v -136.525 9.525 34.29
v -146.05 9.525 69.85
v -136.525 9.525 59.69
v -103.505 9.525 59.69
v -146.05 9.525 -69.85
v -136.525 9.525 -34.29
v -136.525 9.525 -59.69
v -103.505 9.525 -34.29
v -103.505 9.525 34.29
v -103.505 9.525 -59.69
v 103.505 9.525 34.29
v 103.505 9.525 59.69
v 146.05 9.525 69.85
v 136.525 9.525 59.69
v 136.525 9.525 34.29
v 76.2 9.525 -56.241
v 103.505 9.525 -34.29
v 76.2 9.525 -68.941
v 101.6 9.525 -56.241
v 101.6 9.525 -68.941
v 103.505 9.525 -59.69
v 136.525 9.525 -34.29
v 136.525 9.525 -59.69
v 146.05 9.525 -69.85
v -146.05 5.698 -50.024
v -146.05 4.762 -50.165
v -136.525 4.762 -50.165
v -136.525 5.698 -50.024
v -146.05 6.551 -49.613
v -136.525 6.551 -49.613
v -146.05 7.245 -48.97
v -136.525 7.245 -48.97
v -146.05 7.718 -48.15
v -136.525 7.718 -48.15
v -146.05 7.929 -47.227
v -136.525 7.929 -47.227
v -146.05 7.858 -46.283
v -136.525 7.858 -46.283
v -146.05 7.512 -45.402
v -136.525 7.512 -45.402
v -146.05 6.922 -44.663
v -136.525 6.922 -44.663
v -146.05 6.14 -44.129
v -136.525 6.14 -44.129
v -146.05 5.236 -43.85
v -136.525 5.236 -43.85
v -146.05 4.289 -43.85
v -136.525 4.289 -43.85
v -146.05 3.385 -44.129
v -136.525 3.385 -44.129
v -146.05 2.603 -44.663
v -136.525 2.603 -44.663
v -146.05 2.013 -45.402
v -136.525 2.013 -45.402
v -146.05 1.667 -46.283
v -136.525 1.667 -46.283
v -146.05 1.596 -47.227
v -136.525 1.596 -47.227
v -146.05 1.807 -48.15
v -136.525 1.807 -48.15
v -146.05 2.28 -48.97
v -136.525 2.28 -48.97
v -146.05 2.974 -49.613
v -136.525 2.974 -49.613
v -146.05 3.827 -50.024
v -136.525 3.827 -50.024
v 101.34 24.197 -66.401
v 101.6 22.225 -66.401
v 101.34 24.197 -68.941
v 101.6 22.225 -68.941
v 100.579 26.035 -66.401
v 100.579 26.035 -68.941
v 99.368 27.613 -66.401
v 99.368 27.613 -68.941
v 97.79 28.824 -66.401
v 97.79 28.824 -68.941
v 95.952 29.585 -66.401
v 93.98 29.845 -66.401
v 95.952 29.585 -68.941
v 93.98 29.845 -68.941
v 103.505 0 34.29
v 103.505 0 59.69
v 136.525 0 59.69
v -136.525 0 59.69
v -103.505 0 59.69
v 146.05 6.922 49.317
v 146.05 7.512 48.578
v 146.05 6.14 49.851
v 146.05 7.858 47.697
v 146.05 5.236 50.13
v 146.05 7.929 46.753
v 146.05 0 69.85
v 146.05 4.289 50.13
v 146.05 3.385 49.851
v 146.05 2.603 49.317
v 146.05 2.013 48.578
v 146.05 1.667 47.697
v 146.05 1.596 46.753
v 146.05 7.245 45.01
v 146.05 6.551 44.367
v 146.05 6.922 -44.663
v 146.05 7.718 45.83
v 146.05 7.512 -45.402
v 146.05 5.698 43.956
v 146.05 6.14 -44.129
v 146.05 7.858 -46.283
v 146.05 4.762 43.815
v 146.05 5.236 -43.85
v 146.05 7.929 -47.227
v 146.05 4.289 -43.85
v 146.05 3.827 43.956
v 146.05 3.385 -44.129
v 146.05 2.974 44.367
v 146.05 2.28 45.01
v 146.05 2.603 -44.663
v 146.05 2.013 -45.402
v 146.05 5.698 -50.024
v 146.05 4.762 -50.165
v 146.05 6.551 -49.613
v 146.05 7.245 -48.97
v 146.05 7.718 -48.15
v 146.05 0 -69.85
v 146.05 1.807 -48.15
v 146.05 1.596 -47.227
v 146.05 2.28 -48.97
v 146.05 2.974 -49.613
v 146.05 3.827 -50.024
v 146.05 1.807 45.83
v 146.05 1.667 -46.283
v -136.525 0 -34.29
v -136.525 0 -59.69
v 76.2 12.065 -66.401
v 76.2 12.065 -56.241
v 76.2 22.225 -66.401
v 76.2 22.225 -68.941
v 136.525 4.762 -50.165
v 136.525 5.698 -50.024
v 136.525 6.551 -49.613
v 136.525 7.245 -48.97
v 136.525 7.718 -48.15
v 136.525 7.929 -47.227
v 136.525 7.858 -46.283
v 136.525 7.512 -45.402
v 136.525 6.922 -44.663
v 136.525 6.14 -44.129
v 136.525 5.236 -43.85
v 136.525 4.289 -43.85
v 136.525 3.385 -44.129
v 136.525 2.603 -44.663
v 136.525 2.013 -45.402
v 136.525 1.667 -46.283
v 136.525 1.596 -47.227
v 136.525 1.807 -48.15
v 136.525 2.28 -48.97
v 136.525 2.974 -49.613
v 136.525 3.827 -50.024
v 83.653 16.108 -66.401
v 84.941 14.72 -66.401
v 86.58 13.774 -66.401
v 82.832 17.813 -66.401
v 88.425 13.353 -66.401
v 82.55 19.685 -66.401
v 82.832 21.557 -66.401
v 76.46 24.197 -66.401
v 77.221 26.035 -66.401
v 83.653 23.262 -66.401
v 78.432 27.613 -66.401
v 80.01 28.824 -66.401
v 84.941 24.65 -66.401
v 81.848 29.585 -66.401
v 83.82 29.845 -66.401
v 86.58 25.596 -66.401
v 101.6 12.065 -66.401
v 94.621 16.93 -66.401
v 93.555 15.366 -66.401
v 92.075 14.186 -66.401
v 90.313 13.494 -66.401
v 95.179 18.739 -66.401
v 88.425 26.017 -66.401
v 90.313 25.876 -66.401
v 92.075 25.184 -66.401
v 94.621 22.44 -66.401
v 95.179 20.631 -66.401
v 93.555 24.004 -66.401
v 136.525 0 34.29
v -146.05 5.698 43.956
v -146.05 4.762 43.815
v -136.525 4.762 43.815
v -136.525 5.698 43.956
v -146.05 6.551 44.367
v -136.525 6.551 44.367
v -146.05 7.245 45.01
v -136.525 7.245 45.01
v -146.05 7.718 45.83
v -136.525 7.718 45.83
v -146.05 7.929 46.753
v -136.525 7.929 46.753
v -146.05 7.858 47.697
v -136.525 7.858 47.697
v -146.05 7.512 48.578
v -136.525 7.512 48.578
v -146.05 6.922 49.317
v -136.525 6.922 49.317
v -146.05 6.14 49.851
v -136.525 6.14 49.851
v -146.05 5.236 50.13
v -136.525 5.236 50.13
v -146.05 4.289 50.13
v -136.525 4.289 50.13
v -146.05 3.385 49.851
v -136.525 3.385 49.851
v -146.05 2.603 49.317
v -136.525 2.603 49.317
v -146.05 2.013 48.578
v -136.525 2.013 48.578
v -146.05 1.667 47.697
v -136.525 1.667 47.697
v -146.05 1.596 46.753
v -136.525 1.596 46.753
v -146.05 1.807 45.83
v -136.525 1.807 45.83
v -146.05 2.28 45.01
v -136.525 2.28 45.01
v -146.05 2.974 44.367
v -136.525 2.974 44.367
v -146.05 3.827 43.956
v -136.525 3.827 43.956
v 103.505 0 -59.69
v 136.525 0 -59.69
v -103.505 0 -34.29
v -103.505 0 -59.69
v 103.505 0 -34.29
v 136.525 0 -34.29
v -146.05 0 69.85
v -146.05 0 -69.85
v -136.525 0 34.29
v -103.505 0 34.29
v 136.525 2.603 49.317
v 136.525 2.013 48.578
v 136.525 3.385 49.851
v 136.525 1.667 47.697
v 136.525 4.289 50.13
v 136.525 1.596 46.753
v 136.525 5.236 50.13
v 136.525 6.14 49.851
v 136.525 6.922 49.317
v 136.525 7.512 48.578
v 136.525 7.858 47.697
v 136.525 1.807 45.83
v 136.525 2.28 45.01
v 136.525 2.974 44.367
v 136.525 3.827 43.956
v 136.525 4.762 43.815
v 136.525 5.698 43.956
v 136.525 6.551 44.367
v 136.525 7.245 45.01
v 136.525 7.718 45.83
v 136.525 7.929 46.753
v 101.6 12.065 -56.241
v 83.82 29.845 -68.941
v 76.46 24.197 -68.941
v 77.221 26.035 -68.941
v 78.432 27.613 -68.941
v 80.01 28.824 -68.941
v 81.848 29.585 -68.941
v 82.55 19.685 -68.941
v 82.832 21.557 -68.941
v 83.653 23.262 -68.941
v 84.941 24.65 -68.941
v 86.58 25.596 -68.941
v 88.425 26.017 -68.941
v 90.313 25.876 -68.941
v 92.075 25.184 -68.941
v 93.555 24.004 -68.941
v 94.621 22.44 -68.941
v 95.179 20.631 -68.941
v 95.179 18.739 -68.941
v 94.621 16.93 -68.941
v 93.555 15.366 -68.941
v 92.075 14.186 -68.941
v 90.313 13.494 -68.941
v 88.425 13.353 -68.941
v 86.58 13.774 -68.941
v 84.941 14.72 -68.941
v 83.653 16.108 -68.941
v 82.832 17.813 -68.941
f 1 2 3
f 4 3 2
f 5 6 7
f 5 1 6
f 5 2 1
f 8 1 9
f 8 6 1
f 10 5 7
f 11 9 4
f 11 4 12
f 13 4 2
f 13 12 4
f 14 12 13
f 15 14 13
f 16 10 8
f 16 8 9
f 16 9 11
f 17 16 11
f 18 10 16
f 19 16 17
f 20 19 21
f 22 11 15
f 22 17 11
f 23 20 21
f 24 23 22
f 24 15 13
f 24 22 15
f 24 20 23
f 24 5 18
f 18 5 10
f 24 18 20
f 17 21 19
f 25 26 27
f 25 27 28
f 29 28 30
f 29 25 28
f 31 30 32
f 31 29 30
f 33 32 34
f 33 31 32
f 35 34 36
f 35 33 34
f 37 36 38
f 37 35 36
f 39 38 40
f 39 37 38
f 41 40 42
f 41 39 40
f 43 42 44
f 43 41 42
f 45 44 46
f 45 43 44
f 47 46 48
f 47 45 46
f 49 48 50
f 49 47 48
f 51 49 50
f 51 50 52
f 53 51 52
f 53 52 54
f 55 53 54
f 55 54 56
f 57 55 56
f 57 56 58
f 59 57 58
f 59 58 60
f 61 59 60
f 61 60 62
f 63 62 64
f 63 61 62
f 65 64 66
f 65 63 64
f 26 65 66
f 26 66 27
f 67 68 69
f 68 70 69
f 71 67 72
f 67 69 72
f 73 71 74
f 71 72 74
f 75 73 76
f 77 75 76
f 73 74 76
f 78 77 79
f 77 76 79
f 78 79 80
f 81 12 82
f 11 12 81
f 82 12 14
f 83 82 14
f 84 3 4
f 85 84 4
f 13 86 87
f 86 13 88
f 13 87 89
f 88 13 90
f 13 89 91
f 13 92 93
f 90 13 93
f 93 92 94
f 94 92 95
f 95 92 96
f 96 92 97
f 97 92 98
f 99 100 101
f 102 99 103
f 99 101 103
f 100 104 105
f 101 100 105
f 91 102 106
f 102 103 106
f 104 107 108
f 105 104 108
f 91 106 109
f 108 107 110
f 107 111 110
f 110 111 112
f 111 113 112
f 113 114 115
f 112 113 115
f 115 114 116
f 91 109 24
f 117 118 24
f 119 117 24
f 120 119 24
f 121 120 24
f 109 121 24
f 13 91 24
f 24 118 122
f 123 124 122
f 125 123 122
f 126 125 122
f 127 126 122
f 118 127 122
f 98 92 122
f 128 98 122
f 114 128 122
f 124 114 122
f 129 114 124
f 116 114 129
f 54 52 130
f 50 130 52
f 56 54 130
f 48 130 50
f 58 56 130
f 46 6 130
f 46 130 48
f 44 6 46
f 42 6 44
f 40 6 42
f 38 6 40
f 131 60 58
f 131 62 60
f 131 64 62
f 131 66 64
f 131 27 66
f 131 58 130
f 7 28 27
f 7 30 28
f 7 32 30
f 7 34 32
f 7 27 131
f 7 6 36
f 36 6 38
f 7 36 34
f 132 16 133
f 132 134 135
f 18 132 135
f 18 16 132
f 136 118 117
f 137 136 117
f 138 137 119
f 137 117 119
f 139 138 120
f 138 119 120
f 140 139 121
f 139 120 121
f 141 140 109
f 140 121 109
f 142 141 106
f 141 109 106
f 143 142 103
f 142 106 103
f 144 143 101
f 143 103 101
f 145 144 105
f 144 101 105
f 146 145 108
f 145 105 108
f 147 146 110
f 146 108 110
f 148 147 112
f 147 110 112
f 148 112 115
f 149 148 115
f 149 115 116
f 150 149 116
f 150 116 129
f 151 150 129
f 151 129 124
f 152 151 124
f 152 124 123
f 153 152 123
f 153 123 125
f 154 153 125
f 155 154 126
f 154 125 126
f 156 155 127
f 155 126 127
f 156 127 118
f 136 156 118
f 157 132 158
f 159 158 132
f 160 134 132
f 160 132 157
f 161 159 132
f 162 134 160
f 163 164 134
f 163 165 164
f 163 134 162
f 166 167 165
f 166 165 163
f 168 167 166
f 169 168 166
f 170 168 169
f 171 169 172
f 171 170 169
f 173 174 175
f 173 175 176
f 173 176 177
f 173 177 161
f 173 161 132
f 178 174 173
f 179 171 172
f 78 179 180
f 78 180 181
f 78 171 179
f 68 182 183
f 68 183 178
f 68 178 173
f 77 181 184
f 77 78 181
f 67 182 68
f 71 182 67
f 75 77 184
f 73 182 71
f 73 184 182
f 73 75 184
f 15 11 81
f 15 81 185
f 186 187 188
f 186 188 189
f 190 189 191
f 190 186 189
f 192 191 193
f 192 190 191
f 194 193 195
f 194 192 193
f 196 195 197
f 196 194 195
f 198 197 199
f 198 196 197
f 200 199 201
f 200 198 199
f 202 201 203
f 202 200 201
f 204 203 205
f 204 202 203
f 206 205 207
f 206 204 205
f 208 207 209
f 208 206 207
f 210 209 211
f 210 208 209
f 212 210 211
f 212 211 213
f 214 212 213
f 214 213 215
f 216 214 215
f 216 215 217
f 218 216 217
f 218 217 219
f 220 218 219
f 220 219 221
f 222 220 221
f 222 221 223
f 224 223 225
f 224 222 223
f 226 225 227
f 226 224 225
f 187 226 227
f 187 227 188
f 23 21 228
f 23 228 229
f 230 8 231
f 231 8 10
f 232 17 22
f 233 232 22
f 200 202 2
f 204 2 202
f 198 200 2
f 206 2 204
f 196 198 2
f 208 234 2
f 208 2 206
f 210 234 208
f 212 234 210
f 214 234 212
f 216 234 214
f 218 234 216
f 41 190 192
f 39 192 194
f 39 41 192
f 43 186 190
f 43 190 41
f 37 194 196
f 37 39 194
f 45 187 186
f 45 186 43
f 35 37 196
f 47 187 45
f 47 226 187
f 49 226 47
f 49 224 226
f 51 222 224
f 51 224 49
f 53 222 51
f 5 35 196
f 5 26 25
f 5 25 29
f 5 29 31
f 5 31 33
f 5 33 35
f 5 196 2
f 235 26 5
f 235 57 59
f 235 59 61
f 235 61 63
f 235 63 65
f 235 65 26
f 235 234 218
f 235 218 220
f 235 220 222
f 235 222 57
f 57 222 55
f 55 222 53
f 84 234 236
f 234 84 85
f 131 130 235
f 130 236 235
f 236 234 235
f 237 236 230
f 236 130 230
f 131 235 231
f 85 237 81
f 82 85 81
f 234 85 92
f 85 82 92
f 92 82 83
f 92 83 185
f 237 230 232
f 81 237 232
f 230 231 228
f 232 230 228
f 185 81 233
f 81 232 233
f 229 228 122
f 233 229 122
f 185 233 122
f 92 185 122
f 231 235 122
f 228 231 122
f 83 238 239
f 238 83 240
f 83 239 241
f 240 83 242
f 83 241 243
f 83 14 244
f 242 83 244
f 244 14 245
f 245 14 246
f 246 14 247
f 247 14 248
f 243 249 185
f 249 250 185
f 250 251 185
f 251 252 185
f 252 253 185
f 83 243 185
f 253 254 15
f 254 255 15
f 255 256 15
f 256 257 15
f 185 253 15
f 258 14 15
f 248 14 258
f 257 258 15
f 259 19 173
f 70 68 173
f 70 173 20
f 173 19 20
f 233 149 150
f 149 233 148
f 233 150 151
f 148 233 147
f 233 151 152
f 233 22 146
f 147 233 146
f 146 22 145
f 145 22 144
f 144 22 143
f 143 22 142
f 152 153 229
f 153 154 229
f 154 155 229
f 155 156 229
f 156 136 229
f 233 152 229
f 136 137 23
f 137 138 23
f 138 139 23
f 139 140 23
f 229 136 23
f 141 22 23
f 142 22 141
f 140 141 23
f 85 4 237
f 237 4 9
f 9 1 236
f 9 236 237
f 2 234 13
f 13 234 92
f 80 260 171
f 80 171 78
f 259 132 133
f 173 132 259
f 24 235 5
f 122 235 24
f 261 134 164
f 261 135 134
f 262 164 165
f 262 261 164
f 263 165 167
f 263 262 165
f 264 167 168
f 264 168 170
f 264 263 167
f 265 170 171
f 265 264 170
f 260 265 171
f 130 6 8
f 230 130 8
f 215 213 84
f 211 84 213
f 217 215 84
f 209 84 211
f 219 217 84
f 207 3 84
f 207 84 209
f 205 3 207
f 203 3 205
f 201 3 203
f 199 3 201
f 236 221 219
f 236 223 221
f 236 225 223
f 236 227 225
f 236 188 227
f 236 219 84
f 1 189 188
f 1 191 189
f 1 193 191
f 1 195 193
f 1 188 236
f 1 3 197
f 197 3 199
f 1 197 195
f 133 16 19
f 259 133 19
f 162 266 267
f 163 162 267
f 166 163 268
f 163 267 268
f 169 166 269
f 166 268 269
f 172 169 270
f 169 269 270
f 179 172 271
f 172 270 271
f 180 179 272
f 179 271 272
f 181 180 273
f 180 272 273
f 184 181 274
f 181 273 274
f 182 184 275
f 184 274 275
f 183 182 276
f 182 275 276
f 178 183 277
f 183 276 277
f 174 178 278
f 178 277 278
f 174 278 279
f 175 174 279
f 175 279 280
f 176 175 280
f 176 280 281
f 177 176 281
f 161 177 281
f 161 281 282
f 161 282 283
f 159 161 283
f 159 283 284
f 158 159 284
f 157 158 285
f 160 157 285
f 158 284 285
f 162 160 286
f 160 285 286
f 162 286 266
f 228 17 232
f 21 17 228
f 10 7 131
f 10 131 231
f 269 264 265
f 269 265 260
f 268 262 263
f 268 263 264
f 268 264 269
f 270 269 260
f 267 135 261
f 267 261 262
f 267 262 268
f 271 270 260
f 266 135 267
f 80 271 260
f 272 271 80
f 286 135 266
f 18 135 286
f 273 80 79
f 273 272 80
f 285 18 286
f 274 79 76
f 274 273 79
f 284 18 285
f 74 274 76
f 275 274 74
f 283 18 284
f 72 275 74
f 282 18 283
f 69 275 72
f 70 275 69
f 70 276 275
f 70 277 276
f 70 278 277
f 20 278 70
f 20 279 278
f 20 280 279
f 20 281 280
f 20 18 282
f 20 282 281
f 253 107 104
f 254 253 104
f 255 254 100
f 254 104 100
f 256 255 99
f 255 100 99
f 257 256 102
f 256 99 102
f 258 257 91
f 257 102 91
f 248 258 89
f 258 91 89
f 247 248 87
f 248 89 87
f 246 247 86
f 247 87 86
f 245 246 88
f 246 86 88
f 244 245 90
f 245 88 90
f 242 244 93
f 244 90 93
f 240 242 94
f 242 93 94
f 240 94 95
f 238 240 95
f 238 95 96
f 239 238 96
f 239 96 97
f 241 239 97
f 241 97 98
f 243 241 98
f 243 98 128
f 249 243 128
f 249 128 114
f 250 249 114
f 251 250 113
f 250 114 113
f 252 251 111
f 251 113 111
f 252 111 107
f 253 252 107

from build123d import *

# Parameters (mm, degrees)
SKETCH1_W           = 292.1
SKETCH1_H           = 139.7
BOSS_EXTRUDE1_DEPTH = 9.525
SKETCH2_W           = 33.02
SKETCH2_H           = 25.4
CUT_EXTRUDE1_DEPTH  = 9.525
SKETCH3_R           = 3.175
CUT_EXTRUDE2_DEPTH  = 9.525
SKETCH4_W           = 25.4
SKETCH4_H           = 12.7
BOSS_EXTRUDE2_DEPTH = 20.32
SKETCH5_W           = 25.4
SKETCH5_H           = 10.16
CUT_EXTRUDE3_DEPTH  = 17.78
FILLET2_R           = 7.62
SKETCH6_R           = 6.35
CUT_EXTRUDE4_DEPTH  = 2.54


with BuildPart() as part:
    # Sketch1 → Boss-Extrude1 (new body)
    with BuildSketch(Plane(origin=(0, 0, 0), x_dir=(1, 0, 0), z_dir=(0, 1, 0))):
        Rectangle(SKETCH1_W, SKETCH1_H)
    extrude(amount=BOSS_EXTRUDE1_DEPTH)

    # Sketch2 → Cut-Extrude1 (cut)
    with BuildSketch(Plane(origin=(0, 9.525, 0), x_dir=(1, 0, 0), z_dir=(0, 1, 0))):
        with Locations((-120.015, 46.99)):
            Rectangle(SKETCH2_W, SKETCH2_H)
        with Locations((-120.015, -46.99)):
            Rectangle(SKETCH2_W, SKETCH2_H)
        with Locations((120.015, 46.99)):
            Rectangle(SKETCH2_W, SKETCH2_H)
        with Locations((120.015, -46.99)):
            Rectangle(SKETCH2_W, SKETCH2_H)
    extrude(amount=-CUT_EXTRUDE1_DEPTH, mode=Mode.SUBTRACT)

    # Sketch3 → Cut-Extrude2 (cut)
    with BuildSketch(Plane(origin=(146.05, 0, 0), x_dir=(0, 0, -1), z_dir=(1, 0, 0))):
        with Locations((-46.99, 4.7625)):
            Circle(SKETCH3_R)
        with Locations((46.99, 4.7625)):
            Circle(SKETCH3_R)
    cut_extrude2 = extrude(amount=-CUT_EXTRUDE2_DEPTH, mode=Mode.SUBTRACT)

    # Mirror1: Cut-Extrude2 across plane
    add(cut_extrude2.mirror(Plane(origin=(0, 0, 0), x_dir=(0, 0, 1), z_dir=(1, 0, 0))), mode=Mode.SUBTRACT)

    # Sketch4 → Boss-Extrude2 (add)
    with BuildSketch(Plane(origin=(0, 9.525, 0), x_dir=(1, 0, 0), z_dir=(0, 1, 0))):
        with Locations((88.9, 62.590737259)):
            Rectangle(SKETCH4_W, SKETCH4_H)
    extrude(amount=BOSS_EXTRUDE2_DEPTH)

    # Sketch5 → Cut-Extrude3 (cut)
    with BuildSketch(Plane(origin=(0, 29.845, 0), x_dir=(1, 0, 0), z_dir=(0, 1, 0))):
        with Locations((88.9, 61.320737259)):
            Rectangle(SKETCH5_W, SKETCH5_H)
    extrude(amount=-CUT_EXTRUDE3_DEPTH, mode=Mode.SUBTRACT)

    # Fillet2
    fillet2_edges = [part.edges().sort_by_distance(p)[0] for p in [
        (101.6, 29.845, -67.670737259),
        (76.2, 29.845, -67.670737259),
    ]]
    fillet(fillet2_edges, radius=FILLET2_R)

    # Sketch6 → Cut-Extrude4 (cut)
    with BuildSketch(Plane(origin=(0, 0, -68.940737259), x_dir=(-1, 0, 0), z_dir=(0, 0, -1))):
        with Locations((-88.9, 19.685)):
            Circle(SKETCH6_R)
    extrude(amount=-CUT_EXTRUDE4_DEPTH, mode=Mode.SUBTRACT)


solid = part.part
